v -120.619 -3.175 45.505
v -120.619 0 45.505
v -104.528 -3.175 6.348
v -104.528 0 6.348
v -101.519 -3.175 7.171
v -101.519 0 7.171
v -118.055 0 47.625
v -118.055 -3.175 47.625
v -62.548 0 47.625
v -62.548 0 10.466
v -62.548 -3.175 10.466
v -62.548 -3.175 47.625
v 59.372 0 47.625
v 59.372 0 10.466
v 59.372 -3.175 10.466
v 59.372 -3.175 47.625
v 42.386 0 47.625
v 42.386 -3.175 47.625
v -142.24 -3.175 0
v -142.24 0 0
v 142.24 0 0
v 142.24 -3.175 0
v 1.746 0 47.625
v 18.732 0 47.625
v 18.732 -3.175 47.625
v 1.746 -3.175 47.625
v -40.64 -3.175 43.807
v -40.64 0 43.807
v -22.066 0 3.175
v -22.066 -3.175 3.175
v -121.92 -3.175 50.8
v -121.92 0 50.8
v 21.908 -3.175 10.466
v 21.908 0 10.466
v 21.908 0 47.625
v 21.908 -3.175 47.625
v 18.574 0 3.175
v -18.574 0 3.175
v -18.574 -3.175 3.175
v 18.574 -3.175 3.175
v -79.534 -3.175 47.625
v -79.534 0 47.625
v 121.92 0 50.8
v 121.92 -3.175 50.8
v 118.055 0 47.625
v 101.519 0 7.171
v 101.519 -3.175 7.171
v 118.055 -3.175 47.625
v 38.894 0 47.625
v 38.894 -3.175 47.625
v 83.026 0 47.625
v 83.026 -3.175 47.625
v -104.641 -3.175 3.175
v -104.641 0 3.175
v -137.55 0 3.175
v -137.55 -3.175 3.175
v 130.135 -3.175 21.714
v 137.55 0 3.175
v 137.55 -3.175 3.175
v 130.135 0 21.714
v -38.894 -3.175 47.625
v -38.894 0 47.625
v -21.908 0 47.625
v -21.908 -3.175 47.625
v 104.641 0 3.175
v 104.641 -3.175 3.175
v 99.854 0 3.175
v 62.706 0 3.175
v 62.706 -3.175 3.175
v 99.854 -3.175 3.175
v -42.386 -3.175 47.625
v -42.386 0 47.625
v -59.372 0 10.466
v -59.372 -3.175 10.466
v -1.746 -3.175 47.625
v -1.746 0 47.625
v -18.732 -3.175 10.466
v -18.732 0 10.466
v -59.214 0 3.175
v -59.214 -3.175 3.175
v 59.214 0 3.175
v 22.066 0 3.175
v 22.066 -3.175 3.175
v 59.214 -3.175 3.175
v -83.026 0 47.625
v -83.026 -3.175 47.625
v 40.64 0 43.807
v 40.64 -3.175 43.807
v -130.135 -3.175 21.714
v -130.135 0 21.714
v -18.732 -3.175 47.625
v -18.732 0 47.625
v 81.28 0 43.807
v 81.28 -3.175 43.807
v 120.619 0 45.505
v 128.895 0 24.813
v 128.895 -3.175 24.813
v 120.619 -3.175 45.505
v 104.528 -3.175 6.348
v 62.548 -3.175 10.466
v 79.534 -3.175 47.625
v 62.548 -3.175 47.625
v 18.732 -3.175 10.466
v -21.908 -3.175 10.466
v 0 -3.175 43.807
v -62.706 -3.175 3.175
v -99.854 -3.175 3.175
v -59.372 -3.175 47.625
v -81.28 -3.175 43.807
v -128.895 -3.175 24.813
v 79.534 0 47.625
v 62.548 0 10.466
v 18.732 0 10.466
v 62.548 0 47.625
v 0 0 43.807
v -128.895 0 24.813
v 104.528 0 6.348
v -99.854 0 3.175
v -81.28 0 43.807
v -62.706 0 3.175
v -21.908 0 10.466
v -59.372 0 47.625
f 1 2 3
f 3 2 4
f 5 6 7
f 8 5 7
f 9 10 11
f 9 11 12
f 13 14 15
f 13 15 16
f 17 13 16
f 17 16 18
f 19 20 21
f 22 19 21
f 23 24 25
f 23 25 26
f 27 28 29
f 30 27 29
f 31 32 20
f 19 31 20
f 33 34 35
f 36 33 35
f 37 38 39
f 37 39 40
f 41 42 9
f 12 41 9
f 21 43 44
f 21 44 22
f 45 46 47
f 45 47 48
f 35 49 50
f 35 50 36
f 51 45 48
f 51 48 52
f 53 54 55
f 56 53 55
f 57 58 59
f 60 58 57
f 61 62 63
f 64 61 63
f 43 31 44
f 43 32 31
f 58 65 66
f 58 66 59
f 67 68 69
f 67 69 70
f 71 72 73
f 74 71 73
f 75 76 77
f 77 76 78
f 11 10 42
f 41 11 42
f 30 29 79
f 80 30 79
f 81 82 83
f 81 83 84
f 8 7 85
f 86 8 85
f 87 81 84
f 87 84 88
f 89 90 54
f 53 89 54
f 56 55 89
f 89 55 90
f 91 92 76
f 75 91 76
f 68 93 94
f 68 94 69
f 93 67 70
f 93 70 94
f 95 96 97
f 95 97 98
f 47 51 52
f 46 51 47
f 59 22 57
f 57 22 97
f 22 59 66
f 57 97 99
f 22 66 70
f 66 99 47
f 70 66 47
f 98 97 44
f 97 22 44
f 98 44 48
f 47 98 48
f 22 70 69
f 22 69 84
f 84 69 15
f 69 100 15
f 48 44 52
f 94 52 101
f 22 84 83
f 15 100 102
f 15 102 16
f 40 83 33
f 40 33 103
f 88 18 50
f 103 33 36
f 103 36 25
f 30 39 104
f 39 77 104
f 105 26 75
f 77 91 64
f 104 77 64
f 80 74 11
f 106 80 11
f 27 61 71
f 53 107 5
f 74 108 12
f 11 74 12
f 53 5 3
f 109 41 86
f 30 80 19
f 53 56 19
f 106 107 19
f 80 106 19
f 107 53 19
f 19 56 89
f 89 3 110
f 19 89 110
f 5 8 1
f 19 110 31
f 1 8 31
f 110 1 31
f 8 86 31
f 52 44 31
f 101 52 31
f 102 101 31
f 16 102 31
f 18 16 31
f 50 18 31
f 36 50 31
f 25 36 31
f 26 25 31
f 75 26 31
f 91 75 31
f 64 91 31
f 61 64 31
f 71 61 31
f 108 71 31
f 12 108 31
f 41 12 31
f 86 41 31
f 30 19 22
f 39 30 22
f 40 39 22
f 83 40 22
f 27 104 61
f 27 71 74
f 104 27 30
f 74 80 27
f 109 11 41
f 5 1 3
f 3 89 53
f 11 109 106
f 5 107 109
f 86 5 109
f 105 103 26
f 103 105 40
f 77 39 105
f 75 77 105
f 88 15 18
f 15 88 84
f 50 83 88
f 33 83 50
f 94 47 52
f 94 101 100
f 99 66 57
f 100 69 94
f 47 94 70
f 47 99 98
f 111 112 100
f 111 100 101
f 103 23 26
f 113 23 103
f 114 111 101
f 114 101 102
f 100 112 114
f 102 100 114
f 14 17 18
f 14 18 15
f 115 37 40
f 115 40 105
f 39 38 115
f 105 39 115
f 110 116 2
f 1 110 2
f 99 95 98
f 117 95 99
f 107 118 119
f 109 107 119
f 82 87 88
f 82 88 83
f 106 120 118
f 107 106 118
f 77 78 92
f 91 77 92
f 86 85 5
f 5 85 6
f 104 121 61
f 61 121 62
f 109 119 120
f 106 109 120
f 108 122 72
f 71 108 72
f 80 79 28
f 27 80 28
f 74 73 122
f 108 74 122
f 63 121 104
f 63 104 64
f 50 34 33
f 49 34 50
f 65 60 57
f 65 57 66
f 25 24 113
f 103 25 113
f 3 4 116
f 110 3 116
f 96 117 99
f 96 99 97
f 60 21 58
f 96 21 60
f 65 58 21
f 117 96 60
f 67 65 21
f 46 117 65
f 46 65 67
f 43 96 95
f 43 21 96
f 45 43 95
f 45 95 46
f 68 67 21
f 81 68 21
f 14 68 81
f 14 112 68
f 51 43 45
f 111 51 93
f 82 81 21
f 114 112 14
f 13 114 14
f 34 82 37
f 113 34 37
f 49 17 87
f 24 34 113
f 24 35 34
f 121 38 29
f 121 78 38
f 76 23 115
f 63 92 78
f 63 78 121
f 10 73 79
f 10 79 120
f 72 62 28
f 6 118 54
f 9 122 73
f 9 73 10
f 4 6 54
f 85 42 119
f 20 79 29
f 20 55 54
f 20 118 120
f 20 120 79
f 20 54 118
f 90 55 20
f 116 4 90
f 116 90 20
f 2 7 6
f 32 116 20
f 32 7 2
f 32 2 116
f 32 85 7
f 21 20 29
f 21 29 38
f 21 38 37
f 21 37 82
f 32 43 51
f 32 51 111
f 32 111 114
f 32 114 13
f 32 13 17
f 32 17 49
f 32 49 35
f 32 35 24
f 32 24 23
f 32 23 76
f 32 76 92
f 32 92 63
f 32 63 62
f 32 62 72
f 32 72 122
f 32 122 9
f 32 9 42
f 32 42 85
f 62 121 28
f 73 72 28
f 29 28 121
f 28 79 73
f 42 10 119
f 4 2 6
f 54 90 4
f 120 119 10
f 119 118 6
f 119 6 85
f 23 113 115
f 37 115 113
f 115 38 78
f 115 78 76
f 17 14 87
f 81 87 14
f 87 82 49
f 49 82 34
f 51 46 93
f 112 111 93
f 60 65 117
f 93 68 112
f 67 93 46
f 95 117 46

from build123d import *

# Parameters (mm, degrees)
F1_DEPTH = 3.175
F3_W     = 3.175
F3_H     = 50.8
F4_DEPTH = 3.175
F6_DEPTH = 3.175


# Not quite as in the source:
# - a length typed as a fraction of an inch, garbled in the dataset ("3 / 203.2 mm" for 3/8 in), is restored


with BuildPart() as f1:
    # F0 (on Front) → F1 (new body)
    with BuildSketch(Plane.XZ):
        Polygon((-100.2748559753, 0), (0, 0), (0, 3.175), (-18.5744864726, 3.175), (0, 43.8066891587), (0, 47.625), (0, 50.8), (-121.92, 50.8), (-132.0796890642, 25.4007773395), (-140.97, 3.175), (-142.24, 0), align=None)
        Polygon((-104.6410501003, 3.175), (-137.5504203475, 3.175), (-130.1349730994, 21.7136181201), align=None, mode=Mode.SUBTRACT)
        Polygon((-62.7055135274, 3.175), (-99.8544864726, 3.175), (-81.28, 43.8066891587), align=None, mode=Mode.SUBTRACT)
        Polygon((-40.64, 43.8066891587), (-22.0655135274, 3.175), (-59.2144864726, 3.175), align=None, mode=Mode.SUBTRACT)
        Polygon((-128.8950878765, 24.8133311775), (-120.6186164373, 45.5045097755), (-104.527521639, 6.3479696325), align=None, mode=Mode.SUBTRACT)
        Polygon((-101.5186177981, 7.1713344078), (-118.0554031391, 47.625), (-83.0255135274, 47.625), align=None, mode=Mode.SUBTRACT)
        Polygon((-60.96, 6.9933108413), (-79.5344864726, 47.625), (-42.3855135274, 47.625), align=None, mode=Mode.SUBTRACT)
        Polygon((-38.8944864726, 47.625), (-1.7455135274, 47.625), (-20.32, 6.9933108413), align=None, mode=Mode.SUBTRACT)
    extrude(amount=F1_DEPTH)

    # F2: F1 across face


with BuildPart() as f1_1:
    add(f1.part)
    add(f1.part.mirror(Plane(origin=(0, -1.5875, 47.3033445794), x_dir=(0, 1, 0), z_dir=(1, 0, 0))))

    # F3 (on Front) → F4 (join)
    with BuildSketch(Plane.XZ):
        with Locations((-60.96, 25.4)):
            Rectangle(F3_W, F3_H)
        with Locations((-20.32, 25.4)):
            Rectangle(F3_W, F3_H)
        with Locations((60.96, 25.4)):
            Rectangle(F3_W, F3_H)
        Polygon((22.0655135274, 0), (21.9075, 6.9933108413), (21.9075, 50.8), (18.7325, 50.8), (18.7325, 0), align=None)
    extrude(amount=F4_DEPTH)


with BuildPart() as f6:
    # F5 (on Front) → F6 (new body)
    with BuildSketch(Plane.XZ):
        Polygon((14.0807485003, -20.7951998672), (-43.0692514997, -20.7951998672), (-43.0692514997, -23.9701998672), (-39.8942514997, -23.9701998672), (-39.8942514997, -27.1451998672), (10.9057485003, -27.1451998672), (10.9057485003, -23.9701998672), (14.0807485003, -23.9701998672), align=None)
    extrude(amount=F6_DEPTH)


solid = f1_1.part
